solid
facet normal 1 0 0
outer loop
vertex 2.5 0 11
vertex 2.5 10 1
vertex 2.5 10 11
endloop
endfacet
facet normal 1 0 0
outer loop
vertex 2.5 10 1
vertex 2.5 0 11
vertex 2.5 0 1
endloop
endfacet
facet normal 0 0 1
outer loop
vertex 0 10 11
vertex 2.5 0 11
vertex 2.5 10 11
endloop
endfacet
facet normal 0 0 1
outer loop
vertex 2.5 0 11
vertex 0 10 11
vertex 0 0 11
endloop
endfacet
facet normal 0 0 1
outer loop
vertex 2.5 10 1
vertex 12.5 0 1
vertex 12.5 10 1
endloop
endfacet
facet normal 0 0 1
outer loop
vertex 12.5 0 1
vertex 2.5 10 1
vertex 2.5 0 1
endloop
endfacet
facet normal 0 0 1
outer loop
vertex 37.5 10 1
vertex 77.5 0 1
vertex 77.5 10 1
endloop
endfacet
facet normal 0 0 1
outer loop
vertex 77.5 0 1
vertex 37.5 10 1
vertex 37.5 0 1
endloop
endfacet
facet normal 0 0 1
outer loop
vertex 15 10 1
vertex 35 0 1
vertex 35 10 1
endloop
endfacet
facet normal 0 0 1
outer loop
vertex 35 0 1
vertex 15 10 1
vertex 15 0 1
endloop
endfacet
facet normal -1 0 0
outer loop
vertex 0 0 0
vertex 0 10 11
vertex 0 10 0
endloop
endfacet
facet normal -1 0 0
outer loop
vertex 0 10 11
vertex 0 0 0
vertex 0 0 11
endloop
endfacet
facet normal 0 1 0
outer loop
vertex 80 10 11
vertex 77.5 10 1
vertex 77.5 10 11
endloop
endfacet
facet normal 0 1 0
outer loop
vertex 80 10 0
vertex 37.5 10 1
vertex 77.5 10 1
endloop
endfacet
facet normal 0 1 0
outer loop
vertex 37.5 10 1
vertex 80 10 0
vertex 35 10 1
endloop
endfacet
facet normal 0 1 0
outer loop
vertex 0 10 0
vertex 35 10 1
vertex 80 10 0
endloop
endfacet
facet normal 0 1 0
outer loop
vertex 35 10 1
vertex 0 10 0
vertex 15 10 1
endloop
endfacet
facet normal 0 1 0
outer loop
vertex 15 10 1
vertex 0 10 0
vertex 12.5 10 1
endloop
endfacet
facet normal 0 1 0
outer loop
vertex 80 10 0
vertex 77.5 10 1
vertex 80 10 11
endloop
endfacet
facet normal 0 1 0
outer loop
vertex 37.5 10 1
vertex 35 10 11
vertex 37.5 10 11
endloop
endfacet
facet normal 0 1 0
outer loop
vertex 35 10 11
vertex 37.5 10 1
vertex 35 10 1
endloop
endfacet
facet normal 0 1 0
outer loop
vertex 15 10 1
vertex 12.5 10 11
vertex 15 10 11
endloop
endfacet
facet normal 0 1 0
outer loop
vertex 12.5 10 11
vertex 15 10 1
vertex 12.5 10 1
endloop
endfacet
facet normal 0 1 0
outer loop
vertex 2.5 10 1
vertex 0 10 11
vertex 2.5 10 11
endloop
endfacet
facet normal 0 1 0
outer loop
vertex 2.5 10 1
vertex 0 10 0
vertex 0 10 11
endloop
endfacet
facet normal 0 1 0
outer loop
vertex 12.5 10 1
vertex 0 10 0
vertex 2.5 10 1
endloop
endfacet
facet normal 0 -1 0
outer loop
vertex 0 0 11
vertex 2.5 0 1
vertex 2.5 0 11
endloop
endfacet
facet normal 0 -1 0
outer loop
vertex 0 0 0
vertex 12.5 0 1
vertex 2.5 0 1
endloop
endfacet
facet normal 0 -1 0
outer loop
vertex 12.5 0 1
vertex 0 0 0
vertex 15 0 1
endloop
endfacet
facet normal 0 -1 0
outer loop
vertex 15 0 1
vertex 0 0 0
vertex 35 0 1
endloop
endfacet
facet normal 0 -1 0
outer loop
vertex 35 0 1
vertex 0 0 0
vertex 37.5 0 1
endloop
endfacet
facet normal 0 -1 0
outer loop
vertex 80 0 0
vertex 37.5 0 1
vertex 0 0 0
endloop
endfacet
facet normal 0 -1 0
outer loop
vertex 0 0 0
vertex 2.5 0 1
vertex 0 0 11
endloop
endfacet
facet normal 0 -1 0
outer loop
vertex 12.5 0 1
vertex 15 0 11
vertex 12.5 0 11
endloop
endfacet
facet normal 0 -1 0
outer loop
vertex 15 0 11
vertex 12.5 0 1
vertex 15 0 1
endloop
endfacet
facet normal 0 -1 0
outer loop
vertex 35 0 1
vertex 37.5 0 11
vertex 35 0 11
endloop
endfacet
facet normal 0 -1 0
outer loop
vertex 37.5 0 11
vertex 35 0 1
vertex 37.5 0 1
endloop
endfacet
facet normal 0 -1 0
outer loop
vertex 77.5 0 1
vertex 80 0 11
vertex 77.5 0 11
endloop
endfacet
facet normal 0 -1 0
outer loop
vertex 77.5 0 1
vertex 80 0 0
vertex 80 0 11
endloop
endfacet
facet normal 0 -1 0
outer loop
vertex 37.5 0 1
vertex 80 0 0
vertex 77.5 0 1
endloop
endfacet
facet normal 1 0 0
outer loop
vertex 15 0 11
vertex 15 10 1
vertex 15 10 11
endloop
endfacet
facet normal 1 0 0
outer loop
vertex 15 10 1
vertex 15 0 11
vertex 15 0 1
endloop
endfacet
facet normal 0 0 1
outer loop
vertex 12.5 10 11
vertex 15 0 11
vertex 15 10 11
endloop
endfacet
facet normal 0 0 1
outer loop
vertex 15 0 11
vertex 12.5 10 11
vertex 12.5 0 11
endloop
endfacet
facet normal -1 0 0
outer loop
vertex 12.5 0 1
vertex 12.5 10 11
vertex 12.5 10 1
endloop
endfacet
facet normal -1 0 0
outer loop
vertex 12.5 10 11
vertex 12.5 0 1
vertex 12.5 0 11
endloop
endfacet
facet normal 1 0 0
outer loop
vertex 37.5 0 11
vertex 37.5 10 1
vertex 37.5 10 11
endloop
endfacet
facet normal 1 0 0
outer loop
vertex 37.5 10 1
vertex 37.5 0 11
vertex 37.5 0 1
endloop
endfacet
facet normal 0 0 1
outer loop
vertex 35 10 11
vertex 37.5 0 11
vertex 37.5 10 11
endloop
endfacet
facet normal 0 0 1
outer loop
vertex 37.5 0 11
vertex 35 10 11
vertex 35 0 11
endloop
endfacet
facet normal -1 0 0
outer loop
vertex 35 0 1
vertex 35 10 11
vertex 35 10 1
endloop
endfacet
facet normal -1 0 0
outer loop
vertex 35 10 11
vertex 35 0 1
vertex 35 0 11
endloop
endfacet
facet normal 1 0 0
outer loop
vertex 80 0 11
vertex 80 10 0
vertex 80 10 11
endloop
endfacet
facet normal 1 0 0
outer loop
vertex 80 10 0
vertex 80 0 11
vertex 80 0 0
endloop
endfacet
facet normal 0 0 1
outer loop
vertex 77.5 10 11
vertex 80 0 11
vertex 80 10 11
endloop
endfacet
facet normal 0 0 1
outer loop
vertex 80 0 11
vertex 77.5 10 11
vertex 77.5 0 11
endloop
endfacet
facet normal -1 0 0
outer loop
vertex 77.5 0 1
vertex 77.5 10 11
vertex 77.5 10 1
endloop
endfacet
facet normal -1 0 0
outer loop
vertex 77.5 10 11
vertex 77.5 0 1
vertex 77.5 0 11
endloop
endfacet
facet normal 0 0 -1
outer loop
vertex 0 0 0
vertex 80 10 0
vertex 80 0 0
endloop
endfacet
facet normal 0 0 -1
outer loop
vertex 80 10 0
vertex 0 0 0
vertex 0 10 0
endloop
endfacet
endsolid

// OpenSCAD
/*---------------------------------------------------------
licenced under Creative Commons :
Attribution-NonCommercial-ShareAlike 4.0 International (CC BY-NC-SA 4.0)
http://creativecommons.org/licenses/by-nc-sa/4.0/

Based on the models found here: https://www.matterhackers.com/articles/retraction-just-say-no-to-oozing
and here: https://www.thingiverse.com/thing:1240361/files

Use this link to calibrate retraction using this model: https://www.matterhackers.com/articles/retraction-just-say-no-to-oozing

Basic Instructions - OpenSCAD:
1. The parameters below can be adjusted, though not all need to be.
2. make any required changes then hit F5 to view the model.
3. Press F6 to render and then export to STL.
4. Slice in your favourite software and print.

Note: There is no error checking so you need to use commnon-sense when changing parameters. 

v1.0 - First upload 16-Jun-2019
---------------------------------------------------------*/
//CUSTOMIZER VARIABLES
//these most likely should be changed

//The X dimension of the "cubes", this will affect overall length of the test piece.
cubeX=2.5; //[3:25]

//The Y dimension of the "cubes".
cubeY=10; //[5:25]

//The Z dimension or height of the "cubes".
cubeZ=10; //[10:25]

//The height of the baseplate used to keep pieces together, enter 0 to remove completely. 1mm default.
baseZ=1; //[0:5]

//The distance in mm between the first two "cubes", 10mm is default.
a=10; //[1:75]

//The distance in mm between the second two "cubes", 20mm is default.
b=20; //[1:75]

//The distance in mm between the third two "cubes", 40mm is default.
c=40; //[1:75]
//CUSTOMIZER VARIABLES END
//---------------------------------------------------------------------------------------
//You should not need to make any changes below this line.

translate([0,0,baseZ])
makeCube();

translate([cubeX+a,0,baseZ])
makeCube();

translate([cubeX*2+a+b,0,baseZ])
makeCube();

translate([cubeX*3+a+b+c,0,baseZ])
makeCube();

//make the base
cube([cubeX*4+a+b+c,cubeY,baseZ]);


module makeCube(){
    cube([cubeX,cubeY,cubeZ]);
}
